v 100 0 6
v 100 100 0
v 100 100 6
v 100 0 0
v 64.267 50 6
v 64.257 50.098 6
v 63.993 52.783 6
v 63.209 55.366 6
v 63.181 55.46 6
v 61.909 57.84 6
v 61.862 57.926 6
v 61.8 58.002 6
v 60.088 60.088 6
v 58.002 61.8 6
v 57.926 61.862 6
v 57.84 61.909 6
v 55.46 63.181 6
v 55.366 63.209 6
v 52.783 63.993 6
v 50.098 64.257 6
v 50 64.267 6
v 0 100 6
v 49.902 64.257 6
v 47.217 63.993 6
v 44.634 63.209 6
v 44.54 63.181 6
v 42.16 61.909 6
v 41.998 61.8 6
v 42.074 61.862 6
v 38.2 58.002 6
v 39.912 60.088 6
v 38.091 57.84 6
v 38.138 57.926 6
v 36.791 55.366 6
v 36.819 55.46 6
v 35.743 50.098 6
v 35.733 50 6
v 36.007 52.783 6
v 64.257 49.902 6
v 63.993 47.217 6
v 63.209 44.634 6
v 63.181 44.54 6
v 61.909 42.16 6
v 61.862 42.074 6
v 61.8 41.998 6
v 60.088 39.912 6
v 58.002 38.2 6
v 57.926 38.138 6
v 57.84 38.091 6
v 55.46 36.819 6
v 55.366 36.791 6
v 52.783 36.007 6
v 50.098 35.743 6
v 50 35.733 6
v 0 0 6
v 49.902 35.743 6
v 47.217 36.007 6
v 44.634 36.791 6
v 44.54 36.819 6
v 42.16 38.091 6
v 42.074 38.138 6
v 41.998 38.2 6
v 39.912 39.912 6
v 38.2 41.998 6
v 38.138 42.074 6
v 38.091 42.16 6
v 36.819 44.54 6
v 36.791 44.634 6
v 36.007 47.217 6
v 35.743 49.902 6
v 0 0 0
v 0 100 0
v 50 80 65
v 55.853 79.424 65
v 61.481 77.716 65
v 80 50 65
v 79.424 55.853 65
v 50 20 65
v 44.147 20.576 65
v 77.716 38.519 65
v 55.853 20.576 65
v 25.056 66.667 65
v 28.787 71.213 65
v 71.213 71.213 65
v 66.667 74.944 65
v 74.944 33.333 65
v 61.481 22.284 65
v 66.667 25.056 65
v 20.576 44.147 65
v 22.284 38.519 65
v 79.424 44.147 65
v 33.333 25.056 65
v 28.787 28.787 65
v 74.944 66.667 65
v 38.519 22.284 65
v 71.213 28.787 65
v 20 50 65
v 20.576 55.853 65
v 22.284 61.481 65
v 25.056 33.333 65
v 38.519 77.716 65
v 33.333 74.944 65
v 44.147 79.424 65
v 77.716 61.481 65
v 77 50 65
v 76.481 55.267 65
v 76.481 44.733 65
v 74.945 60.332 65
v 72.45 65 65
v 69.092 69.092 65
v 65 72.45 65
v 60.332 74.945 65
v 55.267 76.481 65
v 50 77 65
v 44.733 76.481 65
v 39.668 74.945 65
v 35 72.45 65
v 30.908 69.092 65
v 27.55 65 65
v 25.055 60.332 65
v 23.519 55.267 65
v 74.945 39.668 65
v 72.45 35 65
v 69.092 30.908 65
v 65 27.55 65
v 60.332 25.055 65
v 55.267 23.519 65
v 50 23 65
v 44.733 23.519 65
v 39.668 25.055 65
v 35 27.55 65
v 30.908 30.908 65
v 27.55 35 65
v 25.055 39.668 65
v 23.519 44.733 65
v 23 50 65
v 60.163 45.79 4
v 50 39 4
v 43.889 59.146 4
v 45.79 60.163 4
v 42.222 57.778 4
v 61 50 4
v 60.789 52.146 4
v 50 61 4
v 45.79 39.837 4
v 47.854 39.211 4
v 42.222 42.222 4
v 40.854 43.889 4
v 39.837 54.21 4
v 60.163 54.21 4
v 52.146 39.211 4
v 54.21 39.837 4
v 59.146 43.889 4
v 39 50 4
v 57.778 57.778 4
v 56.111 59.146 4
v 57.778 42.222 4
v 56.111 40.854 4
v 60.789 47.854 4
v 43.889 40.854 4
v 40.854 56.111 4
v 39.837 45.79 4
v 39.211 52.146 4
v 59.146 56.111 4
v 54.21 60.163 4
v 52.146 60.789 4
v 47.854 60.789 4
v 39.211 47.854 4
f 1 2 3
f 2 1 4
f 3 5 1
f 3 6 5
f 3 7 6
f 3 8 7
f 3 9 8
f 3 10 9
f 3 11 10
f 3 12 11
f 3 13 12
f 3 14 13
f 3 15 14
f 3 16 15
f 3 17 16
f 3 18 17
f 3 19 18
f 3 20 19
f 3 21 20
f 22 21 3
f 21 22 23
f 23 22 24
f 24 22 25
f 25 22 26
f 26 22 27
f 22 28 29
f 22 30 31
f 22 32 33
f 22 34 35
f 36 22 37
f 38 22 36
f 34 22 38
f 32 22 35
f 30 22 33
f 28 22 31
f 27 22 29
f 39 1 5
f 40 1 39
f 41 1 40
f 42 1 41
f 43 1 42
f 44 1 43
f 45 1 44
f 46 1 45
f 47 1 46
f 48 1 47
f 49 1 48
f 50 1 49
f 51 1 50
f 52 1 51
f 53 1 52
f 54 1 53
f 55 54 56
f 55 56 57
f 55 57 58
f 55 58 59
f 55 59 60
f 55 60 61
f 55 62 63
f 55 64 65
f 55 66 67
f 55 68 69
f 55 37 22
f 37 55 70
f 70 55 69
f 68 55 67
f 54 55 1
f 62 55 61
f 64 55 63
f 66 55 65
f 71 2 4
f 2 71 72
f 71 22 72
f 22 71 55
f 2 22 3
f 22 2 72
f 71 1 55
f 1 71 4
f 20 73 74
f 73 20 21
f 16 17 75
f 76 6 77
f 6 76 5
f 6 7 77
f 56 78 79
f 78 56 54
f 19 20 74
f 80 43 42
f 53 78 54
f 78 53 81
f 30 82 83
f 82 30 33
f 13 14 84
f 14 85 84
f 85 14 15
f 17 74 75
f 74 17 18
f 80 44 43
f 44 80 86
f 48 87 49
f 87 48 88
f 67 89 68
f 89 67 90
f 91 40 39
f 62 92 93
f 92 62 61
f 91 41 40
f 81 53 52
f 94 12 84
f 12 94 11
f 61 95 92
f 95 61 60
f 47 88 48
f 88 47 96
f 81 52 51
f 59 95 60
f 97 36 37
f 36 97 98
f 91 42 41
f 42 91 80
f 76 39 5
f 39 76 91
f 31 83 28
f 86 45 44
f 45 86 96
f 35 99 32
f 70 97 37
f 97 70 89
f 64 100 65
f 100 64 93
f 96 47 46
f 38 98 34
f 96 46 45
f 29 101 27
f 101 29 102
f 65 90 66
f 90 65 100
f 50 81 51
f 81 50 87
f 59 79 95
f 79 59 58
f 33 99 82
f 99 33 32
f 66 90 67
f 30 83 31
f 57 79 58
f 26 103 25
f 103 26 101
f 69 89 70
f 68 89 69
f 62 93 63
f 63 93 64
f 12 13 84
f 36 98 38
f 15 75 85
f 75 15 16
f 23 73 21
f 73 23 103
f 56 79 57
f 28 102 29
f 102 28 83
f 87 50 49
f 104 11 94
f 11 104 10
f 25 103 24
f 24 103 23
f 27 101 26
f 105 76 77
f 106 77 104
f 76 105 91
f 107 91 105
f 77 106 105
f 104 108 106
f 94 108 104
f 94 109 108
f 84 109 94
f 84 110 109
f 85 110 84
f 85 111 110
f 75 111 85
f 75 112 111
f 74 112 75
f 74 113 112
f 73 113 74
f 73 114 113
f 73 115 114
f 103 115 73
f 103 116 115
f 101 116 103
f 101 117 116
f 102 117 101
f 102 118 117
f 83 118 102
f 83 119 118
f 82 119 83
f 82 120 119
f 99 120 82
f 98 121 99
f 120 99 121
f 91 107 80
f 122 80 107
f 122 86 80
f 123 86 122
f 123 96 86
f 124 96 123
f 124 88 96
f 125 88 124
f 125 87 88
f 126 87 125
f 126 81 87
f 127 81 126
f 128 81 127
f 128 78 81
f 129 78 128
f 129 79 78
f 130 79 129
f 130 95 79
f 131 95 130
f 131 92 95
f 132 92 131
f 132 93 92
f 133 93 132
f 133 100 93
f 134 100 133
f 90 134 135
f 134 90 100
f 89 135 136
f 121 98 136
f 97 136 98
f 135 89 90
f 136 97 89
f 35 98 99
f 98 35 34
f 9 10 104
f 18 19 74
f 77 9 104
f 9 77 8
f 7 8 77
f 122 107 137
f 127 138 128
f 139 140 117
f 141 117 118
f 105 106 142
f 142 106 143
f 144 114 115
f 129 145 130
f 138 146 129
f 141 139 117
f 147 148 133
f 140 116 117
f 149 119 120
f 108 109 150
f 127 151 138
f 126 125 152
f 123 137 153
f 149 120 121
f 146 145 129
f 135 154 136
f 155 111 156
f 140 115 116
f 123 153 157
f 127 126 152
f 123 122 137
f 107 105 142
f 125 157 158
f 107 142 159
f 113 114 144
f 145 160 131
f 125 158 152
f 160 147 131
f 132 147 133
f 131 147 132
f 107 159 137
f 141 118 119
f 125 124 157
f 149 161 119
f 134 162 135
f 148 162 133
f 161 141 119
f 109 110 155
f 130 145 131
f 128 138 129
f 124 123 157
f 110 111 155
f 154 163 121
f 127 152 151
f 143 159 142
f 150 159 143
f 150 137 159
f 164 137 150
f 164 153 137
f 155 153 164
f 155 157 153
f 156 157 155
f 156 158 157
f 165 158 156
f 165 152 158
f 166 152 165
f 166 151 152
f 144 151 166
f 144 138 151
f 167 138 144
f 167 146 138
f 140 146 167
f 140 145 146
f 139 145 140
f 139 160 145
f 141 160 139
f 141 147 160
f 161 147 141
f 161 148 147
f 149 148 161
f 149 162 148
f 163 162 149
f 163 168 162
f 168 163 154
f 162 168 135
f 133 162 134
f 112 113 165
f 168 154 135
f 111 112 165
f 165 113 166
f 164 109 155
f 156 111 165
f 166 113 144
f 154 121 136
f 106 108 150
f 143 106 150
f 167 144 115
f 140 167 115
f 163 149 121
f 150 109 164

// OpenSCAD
$fn = 32;

// ----------------------------------------------------------------------
// Hopper: funnel with square flange
// ----------------------------------------------------------------------

// --- parameters (mm) ---
fl = 100;                 // flange side, X and Y
fl_t = 6;                 // flange thickness
cone_h = 60;              // cone height above the flange
top_d = 60;               // cone mouth diameter
bot_d = 28;               // cone spout diameter
wall = 3;                 // cone wall thickness

bore_d = bot_d - 2 * wall;  // spout bore diameter
total_h = fl_t + cone_h - 1;  // overall height

difference() {
  union() {
    cube([fl, fl, fl_t]);
    translate([fl / 2, fl / 2, fl_t - 1])
      cylinder(h = cone_h, d1 = bot_d, d2 = top_d);
  }
  translate([fl / 2, fl / 2, fl_t - 2])
    cylinder(h = cone_h + 1, d1 = bore_d, d2 = top_d - 2 * wall);
}
